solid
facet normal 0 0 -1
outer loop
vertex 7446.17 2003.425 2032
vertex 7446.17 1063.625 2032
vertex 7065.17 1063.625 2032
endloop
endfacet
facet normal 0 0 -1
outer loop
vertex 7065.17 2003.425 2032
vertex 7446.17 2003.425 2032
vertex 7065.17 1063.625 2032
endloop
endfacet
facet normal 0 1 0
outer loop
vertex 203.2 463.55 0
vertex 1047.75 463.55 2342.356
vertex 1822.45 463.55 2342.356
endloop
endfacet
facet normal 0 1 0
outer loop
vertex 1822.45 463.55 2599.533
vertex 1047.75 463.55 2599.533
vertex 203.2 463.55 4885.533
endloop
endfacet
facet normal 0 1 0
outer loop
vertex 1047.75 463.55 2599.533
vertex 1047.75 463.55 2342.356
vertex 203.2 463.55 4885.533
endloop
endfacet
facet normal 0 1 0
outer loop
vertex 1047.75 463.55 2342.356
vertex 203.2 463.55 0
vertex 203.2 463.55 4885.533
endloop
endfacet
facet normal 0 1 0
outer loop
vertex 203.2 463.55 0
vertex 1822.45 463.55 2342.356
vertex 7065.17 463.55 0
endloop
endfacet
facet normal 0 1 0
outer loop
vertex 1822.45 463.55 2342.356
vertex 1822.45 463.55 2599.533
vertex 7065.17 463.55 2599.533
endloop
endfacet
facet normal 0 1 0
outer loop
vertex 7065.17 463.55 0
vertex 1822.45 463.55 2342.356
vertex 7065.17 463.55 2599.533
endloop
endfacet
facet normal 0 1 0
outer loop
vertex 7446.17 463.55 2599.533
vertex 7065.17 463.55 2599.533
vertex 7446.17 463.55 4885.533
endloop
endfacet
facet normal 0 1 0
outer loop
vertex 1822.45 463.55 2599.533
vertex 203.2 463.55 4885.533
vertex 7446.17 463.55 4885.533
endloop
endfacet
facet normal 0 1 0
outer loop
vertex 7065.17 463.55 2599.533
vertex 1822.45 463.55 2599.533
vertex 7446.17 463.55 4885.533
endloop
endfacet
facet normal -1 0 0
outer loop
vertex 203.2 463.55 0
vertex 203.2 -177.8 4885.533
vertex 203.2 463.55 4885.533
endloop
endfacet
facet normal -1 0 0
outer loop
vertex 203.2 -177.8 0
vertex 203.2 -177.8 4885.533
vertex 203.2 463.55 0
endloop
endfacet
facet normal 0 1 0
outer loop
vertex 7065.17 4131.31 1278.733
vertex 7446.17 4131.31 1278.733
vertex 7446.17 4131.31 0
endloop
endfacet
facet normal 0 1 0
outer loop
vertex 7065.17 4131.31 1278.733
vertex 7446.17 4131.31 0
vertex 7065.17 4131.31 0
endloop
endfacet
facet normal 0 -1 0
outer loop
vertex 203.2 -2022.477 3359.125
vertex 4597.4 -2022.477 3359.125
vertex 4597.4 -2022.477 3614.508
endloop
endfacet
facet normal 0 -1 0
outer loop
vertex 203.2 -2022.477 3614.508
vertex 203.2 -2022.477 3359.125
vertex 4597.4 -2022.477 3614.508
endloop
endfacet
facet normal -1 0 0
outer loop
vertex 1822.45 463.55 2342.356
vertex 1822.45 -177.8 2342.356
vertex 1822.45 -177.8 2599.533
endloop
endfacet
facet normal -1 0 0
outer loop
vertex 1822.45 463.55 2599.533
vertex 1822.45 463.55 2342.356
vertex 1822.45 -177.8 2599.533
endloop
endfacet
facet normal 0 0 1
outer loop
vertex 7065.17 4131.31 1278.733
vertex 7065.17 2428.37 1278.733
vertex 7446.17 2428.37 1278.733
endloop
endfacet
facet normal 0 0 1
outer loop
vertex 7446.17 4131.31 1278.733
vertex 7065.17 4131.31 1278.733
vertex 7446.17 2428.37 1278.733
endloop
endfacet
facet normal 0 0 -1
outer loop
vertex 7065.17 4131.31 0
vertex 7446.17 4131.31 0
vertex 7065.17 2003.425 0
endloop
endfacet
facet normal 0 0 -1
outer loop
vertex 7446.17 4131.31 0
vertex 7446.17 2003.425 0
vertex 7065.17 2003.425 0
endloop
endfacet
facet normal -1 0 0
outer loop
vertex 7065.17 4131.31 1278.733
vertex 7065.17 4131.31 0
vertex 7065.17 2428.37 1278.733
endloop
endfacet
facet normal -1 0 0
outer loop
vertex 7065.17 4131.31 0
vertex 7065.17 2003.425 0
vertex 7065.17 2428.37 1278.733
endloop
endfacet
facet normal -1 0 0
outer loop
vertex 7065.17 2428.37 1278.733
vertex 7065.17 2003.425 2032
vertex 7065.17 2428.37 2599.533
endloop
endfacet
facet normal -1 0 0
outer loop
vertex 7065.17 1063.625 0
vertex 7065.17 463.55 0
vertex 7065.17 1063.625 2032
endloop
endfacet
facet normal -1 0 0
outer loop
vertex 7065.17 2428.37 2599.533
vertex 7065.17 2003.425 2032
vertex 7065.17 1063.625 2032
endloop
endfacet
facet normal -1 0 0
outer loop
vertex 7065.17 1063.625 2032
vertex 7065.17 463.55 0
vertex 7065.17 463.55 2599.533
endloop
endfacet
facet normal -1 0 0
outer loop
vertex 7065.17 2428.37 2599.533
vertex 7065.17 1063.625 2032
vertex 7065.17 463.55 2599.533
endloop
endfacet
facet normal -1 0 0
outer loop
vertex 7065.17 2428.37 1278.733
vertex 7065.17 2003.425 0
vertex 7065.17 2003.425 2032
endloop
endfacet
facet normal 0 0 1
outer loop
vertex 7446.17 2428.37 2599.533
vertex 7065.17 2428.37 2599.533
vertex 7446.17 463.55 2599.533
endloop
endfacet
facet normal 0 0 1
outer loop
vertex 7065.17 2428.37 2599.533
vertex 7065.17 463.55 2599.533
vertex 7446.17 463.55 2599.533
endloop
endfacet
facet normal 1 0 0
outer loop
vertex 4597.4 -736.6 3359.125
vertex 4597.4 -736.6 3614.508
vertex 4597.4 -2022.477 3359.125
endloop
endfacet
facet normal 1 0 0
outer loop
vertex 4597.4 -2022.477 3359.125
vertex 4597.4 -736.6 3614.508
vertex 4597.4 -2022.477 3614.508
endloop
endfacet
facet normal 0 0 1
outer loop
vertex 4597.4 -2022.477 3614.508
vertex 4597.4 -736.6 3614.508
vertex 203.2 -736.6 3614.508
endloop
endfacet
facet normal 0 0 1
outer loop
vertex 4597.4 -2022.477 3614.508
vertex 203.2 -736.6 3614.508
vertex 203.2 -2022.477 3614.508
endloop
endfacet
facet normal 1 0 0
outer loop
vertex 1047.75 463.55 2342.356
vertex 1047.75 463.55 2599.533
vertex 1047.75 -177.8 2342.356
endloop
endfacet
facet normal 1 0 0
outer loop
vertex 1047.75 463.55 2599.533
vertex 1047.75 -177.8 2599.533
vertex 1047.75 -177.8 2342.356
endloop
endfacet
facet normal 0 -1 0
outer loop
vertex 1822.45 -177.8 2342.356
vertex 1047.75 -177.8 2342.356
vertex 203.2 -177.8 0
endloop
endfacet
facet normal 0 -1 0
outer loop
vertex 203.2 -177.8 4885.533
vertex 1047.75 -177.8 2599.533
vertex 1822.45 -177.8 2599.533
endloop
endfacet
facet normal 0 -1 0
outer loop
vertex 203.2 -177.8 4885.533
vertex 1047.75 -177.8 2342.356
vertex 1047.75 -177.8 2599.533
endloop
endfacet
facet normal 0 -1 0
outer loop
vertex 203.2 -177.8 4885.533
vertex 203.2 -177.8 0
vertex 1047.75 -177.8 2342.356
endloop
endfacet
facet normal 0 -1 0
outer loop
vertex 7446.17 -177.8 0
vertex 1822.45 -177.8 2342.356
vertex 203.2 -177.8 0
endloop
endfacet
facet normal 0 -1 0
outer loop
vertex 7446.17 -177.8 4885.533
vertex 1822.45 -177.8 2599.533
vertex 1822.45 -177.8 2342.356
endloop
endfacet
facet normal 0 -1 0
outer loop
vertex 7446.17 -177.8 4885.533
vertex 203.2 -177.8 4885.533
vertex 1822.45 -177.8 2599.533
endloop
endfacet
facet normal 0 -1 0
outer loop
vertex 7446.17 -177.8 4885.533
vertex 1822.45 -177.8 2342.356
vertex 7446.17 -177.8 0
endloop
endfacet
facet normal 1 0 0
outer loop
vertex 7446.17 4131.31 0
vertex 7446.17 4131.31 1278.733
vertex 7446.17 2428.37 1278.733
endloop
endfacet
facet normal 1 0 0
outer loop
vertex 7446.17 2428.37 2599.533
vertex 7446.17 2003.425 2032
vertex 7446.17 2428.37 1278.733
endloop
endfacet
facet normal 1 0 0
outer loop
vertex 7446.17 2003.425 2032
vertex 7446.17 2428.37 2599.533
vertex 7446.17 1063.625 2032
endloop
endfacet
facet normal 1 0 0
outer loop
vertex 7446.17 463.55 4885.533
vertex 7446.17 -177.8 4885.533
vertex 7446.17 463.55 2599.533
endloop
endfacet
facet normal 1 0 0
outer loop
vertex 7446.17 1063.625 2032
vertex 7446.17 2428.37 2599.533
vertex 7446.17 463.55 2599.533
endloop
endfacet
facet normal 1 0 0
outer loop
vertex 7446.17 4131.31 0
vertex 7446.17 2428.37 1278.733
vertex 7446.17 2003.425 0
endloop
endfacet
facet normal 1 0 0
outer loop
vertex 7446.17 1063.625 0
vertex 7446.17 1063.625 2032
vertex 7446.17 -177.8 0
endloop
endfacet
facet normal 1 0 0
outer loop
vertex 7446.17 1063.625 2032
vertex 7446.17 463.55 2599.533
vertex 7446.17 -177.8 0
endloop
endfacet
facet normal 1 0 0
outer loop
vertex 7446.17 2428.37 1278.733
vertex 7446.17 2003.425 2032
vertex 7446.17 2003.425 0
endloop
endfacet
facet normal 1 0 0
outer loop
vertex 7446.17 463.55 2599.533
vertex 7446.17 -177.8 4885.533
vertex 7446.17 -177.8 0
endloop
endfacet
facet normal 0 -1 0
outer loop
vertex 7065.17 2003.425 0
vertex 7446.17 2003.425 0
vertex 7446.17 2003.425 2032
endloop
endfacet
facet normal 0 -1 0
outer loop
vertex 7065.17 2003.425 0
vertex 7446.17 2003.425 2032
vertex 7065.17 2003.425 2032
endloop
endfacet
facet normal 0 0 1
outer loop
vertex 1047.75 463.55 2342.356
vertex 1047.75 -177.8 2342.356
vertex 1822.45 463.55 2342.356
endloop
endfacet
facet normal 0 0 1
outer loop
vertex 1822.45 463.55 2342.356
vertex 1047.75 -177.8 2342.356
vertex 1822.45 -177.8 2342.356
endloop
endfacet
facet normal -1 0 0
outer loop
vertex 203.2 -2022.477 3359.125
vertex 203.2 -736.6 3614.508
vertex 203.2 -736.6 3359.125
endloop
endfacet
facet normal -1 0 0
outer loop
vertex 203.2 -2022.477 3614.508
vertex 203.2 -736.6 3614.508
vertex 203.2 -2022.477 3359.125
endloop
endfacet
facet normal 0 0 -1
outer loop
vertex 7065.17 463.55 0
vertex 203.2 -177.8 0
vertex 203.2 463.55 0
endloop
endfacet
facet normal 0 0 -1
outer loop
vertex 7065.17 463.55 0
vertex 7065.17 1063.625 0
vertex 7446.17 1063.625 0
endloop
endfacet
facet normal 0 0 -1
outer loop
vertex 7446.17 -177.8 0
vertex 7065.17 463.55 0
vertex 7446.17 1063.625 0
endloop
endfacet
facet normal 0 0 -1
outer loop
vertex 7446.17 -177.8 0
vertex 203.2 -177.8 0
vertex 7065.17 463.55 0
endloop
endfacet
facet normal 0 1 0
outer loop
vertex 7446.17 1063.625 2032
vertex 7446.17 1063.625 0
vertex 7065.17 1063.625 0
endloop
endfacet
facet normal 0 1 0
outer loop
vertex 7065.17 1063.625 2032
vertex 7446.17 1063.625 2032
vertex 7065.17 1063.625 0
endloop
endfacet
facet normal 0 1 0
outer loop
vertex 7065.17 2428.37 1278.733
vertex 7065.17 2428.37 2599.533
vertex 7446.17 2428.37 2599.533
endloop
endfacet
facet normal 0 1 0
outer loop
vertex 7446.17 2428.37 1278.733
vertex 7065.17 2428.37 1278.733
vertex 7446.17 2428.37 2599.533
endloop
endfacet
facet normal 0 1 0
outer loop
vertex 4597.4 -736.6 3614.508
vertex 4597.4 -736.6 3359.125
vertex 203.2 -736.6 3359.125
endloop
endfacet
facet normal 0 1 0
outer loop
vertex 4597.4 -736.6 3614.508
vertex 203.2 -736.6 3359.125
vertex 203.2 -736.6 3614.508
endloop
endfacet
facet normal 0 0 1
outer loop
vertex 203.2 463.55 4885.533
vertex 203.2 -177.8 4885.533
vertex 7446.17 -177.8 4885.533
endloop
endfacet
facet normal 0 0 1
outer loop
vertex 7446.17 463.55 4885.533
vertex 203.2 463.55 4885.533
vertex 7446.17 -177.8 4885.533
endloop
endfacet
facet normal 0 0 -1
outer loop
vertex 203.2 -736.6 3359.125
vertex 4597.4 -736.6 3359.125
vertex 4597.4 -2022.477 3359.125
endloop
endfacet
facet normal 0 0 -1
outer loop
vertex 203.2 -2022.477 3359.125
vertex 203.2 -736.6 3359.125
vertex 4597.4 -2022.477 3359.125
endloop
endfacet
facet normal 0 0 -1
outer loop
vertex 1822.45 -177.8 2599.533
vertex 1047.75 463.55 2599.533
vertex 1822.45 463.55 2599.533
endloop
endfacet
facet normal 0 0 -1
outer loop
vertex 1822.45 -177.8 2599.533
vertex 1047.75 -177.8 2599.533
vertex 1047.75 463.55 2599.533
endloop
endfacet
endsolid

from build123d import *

# Parameters (mm, degrees)
F0_W      = 7268.37002
F0_H      = 4074.32002
F0_W_2    = 6861.97002
F0_H_2    = 3667.92002
F1_DEPTH  = 2599.53252
F2_W      = 431.8
F2_H      = 133.35
F3_DEPTH  = 203.2
F4_W      = 304.8
F4_H      = 254
F5_DEPTH  = 203.2
F6_DEPTH  = 381
F7_DEPTH  = 254
F8_DEPTH  = 106.68
F9_DEPTH  = 38.1
F10_DEPTH = 17.14627
F11_W     = 914.4
F11_H     = 2082.8
F12_DEPTH = 203.2
F13_DEPTH = 177.8
F14_DEPTH = 203.2
F15_DEPTH = 127
F16_DEPTH = 203.2
F17_DEPTH = 203.2
F18_DEPTH = 6861.97102
F19_DEPTH = 381
F20_W     = 381
F20_H     = 2599.53252
F21_DEPTH = 600.075
F22_W     = 381
F22_H     = 567.53252
F23_DEPTH = 812.8
F24_W     = 381
F24_H     = 2032
F24_H_2   = 567.53252
F25_DEPTH = 2254.885
F26_W     = 381
F26_H     = 1426.0795144653
F27_DEPTH = 1320.8
F28_DEPTH = 403.86
F29_DEPTH = 127
F30_DEPTH = 127
F31_DEPTH = 2286
F33_DEPTH = 381
F34_W     = 1285.8766731262
F34_H     = 255.3832530975
F35_DEPTH = 4394.2
F36_DEPTH = 260.35
F37_DEPTH = 260.35
F38_DEPTH = 260.35
F39_DEPTH = 260.35


with BuildPart() as f1:
    # F0 (on Top) → F1 (new body)
    with BuildSketch(Plane.XY):
        with Locations((3634.18501, 2037.16001)):
            Rectangle(F0_W, F0_H)
        with Locations((3634.18501, 2037.16001)):
            Rectangle(F0_W_2, F0_H_2, mode=Mode.SUBTRACT)
    extrude(amount=F1_DEPTH)

    # F2 (on Front) → F3 (cut)
    with BuildSketch(Plane.XZ):
        with Locations((1479.55, 2409.03125)):
            Rectangle(F2_W, F2_H)
    extrude(amount=-F3_DEPTH, mode=Mode.SUBTRACT)

    # F4 (on face) → F5 (cut)
    with BuildSketch(Plane(origin=(0, 203.2, 0), x_dir=(-1, 0, 0), z_dir=(0, 1, 0))):
        with Locations((-6077.74502, 2362.2)):
            Rectangle(F4_W, F4_H)
    extrude(amount=-F5_DEPTH, mode=Mode.SUBTRACT)

    # F6 (cut): a face of the model
    f6_faces = [f1.faces().sort_by_distance(p)[0] for p in [
        (1263.65, 101.6, 2409.03125),
    ]]
    extrude(f6_faces, amount=-F6_DEPTH, mode=Mode.SUBTRACT)

    # F7 (add, through all): a face of the model
    f7_faces = [f1.faces().sort_by_distance(p)[0] for p in [
        (6077.74502, 101.6, 2235.2),
    ]]
    extrude(f7_faces, amount=F7_DEPTH)

    # F8 (cut): a face of the model
    f8_faces = [f1.faces().sort_by_distance(p)[0] for p in [
        (1289.05, 101.6, 2475.70625),
    ]]
    extrude(f8_faces, amount=-F8_DEPTH, mode=Mode.SUBTRACT)

    # F9 (cut): a face of the model
    f9_faces = [f1.faces().sort_by_distance(p)[0] for p in [
        (882.65, 101.6, 2462.37125),
    ]]
    extrude(f9_faces, amount=-F9_DEPTH, mode=Mode.SUBTRACT)

    # F10 (cut, through all): a face of the model
    f10_faces = [f1.faces().sort_by_distance(p)[0] for p in [
        (1270, 101.6, 2582.38625),
    ]]
    extrude(f10_faces, amount=-F10_DEPTH, mode=Mode.SUBTRACT)

    # F11 (on face) → F12 (cut, through all)
    with BuildSketch(Plane(origin=(7065.17002, 0, 0), x_dir=(0, -1, 0), z_dir=(-1, 0, 0))):
        with Locations((-1260.475, 1041.4)):
            Rectangle(F11_W, F11_H)
    extrude(amount=-F12_DEPTH, mode=Mode.SUBTRACT)

    # F13 (add): a face of the model
    f13_faces = [f1.faces().sort_by_distance(p)[0] for p in [
        (3661.8874403743, 0, 1286.0429344876),
    ]]
    extrude(f13_faces, amount=F13_DEPTH)

    # F14 (add): a face of the model
    f14_faces = [f1.faces().sort_by_distance(p)[0] for p in [
        (844.55, 12.7, 2470.944385),
    ]]
    extrude(f14_faces, amount=F14_DEPTH)

    # F15 (cut): a face of the model
    f15_faces = [f1.faces().sort_by_distance(p)[0] for p in [
        (1695.45, 12.7, 2470.944385),
    ]]
    extrude(f15_faces, amount=-F15_DEPTH, mode=Mode.SUBTRACT)

    # F16 (cut, through all): a face of the model
    f16_faces = [f1.faces().sort_by_distance(p)[0] for p in [
        (7268.37002, 2091.4333965997, 1353.5493054131),
    ]]
    extrude(f16_faces, amount=-F16_DEPTH, mode=Mode.SUBTRACT)

    # F17 (cut, through all): a face of the model
    f17_faces = [f1.faces().sort_by_distance(p)[0] for p in [
        (0, 1948.26001, 1299.76626),
    ]]
    extrude(f17_faces, amount=-F17_DEPTH, mode=Mode.SUBTRACT)

    # F18 (cut, through all): a face of the model
    f18_faces = [f1.faces().sort_by_distance(p)[0] for p in [
        (7065.17002, 3972.72002, 1299.76626),
    ]]
    extrude(f18_faces, amount=-F18_DEPTH, mode=Mode.SUBTRACT)

    # F19 (add): a face of the model
    f19_faces = [f1.faces().sort_by_distance(p)[0] for p in [
        (7065.17002, 12.7, 1299.76626),
    ]]
    extrude(f19_faces, amount=F19_DEPTH)

    # F20 (on face) → F21 (join)
    with BuildSketch(Plane(origin=(0, 203.2, 0), x_dir=(-1, 0, 0), z_dir=(0, 1, 0))):
        with Locations((-7255.67002, 1299.76626)):
            Rectangle(F20_W, F20_H)
    extrude(amount=F21_DEPTH)

    # F22 (on face) → F23 (join)
    with BuildSketch(Plane(origin=(0, 803.275, 0), x_dir=(-1, 0, 0), z_dir=(0, 1, 0))):
        with Locations((-7255.67002, 2315.76626)):
            Rectangle(F22_W, F22_H)
    extrude(amount=F23_DEPTH)

    # F24 (on face) → F25 (join)
    with BuildSketch(Plane(origin=(0, 1616.075, 0), x_dir=(-1, 0, 0), z_dir=(0, 1, 0))):
        with Locations((-7255.67002, 1016)):
            Rectangle(F24_W, F24_H)
        with Locations((-7255.67002, 2315.76626)):
            Rectangle(F24_W, F24_H_2)
    extrude(amount=F25_DEPTH)

    # F26 (on face) → F27 (cut)
    with BuildSketch(Plane.XY.offset(2599.53252)):
        with Locations((7255.67002, 3157.9202427673)):
            Rectangle(F26_W, F26_H)
    extrude(amount=-F27_DEPTH, mode=Mode.SUBTRACT)

    # F28 (cut): a face of the model
    f28_faces = [f1.faces().sort_by_distance(p)[0] for p in [
        (7255.67002, 2444.8804855347, 1939.13252),
    ]]
    extrude(f28_faces, amount=-F28_DEPTH, mode=Mode.SUBTRACT)

    # F29 (cut): a face of the model
    f29_faces = [f1.faces().sort_by_distance(p)[0] for p in [
        (7255.67002, 1616.075, 1016),
    ]]
    extrude(f29_faces, amount=-F29_DEPTH, mode=Mode.SUBTRACT)

    # F30 (add): a face of the model
    f30_faces = [f1.faces().sort_by_distance(p)[0] for p in [
        (7255.67002, 2041.0204855347, 1939.13252),
    ]]
    extrude(f30_faces, amount=F30_DEPTH)

    # F31 (add): a face of the model
    f31_faces = [f1.faces().sort_by_distance(p)[0] for p in [
        (625.475, 12.7, 2599.53252),
    ]]
    extrude(f31_faces, amount=F31_DEPTH)

    # F32 (on face) → F33 (join, through all)
    with BuildSketch(Plane.XZ.offset(177.8)):
        Polygon((1047.75, 4885.53252), (1047.75, 2599.53252), (1822.45, 2599.53252), (7446.17002, 2599.53252), (7446.17002, 4885.53252), align=None)
    extrude(amount=-F33_DEPTH)

    # F36 (add): a face of the model
    f36_faces = [f1.faces().sort_by_distance(p)[0] for p in [
        (3739.2356692954, 203.2, 2475.7067959976),
    ]]
    extrude(f36_faces, amount=F36_DEPTH)

    # F37 (add): faces of the model
    f37_faces = [f1.faces().sort_by_distance(p)[0] for p in [
        (7255.67002, 2168.0204855347, 1939.13252),
        (7255.67002, 803.275, 1016),
    ]]
    extrude(f37_faces, amount=F37_DEPTH)

    # F38 (cut): a face of the model
    f38_faces = [f1.faces().sort_by_distance(p)[0] for p in [
        (7255.67002, 1743.075, 1016),
    ]]
    extrude(f38_faces, amount=-F38_DEPTH, mode=Mode.SUBTRACT)

    # F39 (add): a face of the model
    f39_faces = [f1.faces().sort_by_distance(p)[0] for p in [
        (7255.67002, 3870.96, 639.36626),
    ]]
    extrude(f39_faces, amount=F39_DEPTH)


with BuildPart() as f35:
    # F34 (on face) → F35 (new body)
    with BuildSketch(Plane(origin=(203.2, 0, 0), x_dir=(0, -1, 0), z_dir=(-1, 0, 0))):
        with Locations((1379.5383365631, 3486.8167638779)):
            Rectangle(F34_W, F34_H)
    extrude(amount=-F35_DEPTH)


solid = Compound([f1.part, f35.part])
